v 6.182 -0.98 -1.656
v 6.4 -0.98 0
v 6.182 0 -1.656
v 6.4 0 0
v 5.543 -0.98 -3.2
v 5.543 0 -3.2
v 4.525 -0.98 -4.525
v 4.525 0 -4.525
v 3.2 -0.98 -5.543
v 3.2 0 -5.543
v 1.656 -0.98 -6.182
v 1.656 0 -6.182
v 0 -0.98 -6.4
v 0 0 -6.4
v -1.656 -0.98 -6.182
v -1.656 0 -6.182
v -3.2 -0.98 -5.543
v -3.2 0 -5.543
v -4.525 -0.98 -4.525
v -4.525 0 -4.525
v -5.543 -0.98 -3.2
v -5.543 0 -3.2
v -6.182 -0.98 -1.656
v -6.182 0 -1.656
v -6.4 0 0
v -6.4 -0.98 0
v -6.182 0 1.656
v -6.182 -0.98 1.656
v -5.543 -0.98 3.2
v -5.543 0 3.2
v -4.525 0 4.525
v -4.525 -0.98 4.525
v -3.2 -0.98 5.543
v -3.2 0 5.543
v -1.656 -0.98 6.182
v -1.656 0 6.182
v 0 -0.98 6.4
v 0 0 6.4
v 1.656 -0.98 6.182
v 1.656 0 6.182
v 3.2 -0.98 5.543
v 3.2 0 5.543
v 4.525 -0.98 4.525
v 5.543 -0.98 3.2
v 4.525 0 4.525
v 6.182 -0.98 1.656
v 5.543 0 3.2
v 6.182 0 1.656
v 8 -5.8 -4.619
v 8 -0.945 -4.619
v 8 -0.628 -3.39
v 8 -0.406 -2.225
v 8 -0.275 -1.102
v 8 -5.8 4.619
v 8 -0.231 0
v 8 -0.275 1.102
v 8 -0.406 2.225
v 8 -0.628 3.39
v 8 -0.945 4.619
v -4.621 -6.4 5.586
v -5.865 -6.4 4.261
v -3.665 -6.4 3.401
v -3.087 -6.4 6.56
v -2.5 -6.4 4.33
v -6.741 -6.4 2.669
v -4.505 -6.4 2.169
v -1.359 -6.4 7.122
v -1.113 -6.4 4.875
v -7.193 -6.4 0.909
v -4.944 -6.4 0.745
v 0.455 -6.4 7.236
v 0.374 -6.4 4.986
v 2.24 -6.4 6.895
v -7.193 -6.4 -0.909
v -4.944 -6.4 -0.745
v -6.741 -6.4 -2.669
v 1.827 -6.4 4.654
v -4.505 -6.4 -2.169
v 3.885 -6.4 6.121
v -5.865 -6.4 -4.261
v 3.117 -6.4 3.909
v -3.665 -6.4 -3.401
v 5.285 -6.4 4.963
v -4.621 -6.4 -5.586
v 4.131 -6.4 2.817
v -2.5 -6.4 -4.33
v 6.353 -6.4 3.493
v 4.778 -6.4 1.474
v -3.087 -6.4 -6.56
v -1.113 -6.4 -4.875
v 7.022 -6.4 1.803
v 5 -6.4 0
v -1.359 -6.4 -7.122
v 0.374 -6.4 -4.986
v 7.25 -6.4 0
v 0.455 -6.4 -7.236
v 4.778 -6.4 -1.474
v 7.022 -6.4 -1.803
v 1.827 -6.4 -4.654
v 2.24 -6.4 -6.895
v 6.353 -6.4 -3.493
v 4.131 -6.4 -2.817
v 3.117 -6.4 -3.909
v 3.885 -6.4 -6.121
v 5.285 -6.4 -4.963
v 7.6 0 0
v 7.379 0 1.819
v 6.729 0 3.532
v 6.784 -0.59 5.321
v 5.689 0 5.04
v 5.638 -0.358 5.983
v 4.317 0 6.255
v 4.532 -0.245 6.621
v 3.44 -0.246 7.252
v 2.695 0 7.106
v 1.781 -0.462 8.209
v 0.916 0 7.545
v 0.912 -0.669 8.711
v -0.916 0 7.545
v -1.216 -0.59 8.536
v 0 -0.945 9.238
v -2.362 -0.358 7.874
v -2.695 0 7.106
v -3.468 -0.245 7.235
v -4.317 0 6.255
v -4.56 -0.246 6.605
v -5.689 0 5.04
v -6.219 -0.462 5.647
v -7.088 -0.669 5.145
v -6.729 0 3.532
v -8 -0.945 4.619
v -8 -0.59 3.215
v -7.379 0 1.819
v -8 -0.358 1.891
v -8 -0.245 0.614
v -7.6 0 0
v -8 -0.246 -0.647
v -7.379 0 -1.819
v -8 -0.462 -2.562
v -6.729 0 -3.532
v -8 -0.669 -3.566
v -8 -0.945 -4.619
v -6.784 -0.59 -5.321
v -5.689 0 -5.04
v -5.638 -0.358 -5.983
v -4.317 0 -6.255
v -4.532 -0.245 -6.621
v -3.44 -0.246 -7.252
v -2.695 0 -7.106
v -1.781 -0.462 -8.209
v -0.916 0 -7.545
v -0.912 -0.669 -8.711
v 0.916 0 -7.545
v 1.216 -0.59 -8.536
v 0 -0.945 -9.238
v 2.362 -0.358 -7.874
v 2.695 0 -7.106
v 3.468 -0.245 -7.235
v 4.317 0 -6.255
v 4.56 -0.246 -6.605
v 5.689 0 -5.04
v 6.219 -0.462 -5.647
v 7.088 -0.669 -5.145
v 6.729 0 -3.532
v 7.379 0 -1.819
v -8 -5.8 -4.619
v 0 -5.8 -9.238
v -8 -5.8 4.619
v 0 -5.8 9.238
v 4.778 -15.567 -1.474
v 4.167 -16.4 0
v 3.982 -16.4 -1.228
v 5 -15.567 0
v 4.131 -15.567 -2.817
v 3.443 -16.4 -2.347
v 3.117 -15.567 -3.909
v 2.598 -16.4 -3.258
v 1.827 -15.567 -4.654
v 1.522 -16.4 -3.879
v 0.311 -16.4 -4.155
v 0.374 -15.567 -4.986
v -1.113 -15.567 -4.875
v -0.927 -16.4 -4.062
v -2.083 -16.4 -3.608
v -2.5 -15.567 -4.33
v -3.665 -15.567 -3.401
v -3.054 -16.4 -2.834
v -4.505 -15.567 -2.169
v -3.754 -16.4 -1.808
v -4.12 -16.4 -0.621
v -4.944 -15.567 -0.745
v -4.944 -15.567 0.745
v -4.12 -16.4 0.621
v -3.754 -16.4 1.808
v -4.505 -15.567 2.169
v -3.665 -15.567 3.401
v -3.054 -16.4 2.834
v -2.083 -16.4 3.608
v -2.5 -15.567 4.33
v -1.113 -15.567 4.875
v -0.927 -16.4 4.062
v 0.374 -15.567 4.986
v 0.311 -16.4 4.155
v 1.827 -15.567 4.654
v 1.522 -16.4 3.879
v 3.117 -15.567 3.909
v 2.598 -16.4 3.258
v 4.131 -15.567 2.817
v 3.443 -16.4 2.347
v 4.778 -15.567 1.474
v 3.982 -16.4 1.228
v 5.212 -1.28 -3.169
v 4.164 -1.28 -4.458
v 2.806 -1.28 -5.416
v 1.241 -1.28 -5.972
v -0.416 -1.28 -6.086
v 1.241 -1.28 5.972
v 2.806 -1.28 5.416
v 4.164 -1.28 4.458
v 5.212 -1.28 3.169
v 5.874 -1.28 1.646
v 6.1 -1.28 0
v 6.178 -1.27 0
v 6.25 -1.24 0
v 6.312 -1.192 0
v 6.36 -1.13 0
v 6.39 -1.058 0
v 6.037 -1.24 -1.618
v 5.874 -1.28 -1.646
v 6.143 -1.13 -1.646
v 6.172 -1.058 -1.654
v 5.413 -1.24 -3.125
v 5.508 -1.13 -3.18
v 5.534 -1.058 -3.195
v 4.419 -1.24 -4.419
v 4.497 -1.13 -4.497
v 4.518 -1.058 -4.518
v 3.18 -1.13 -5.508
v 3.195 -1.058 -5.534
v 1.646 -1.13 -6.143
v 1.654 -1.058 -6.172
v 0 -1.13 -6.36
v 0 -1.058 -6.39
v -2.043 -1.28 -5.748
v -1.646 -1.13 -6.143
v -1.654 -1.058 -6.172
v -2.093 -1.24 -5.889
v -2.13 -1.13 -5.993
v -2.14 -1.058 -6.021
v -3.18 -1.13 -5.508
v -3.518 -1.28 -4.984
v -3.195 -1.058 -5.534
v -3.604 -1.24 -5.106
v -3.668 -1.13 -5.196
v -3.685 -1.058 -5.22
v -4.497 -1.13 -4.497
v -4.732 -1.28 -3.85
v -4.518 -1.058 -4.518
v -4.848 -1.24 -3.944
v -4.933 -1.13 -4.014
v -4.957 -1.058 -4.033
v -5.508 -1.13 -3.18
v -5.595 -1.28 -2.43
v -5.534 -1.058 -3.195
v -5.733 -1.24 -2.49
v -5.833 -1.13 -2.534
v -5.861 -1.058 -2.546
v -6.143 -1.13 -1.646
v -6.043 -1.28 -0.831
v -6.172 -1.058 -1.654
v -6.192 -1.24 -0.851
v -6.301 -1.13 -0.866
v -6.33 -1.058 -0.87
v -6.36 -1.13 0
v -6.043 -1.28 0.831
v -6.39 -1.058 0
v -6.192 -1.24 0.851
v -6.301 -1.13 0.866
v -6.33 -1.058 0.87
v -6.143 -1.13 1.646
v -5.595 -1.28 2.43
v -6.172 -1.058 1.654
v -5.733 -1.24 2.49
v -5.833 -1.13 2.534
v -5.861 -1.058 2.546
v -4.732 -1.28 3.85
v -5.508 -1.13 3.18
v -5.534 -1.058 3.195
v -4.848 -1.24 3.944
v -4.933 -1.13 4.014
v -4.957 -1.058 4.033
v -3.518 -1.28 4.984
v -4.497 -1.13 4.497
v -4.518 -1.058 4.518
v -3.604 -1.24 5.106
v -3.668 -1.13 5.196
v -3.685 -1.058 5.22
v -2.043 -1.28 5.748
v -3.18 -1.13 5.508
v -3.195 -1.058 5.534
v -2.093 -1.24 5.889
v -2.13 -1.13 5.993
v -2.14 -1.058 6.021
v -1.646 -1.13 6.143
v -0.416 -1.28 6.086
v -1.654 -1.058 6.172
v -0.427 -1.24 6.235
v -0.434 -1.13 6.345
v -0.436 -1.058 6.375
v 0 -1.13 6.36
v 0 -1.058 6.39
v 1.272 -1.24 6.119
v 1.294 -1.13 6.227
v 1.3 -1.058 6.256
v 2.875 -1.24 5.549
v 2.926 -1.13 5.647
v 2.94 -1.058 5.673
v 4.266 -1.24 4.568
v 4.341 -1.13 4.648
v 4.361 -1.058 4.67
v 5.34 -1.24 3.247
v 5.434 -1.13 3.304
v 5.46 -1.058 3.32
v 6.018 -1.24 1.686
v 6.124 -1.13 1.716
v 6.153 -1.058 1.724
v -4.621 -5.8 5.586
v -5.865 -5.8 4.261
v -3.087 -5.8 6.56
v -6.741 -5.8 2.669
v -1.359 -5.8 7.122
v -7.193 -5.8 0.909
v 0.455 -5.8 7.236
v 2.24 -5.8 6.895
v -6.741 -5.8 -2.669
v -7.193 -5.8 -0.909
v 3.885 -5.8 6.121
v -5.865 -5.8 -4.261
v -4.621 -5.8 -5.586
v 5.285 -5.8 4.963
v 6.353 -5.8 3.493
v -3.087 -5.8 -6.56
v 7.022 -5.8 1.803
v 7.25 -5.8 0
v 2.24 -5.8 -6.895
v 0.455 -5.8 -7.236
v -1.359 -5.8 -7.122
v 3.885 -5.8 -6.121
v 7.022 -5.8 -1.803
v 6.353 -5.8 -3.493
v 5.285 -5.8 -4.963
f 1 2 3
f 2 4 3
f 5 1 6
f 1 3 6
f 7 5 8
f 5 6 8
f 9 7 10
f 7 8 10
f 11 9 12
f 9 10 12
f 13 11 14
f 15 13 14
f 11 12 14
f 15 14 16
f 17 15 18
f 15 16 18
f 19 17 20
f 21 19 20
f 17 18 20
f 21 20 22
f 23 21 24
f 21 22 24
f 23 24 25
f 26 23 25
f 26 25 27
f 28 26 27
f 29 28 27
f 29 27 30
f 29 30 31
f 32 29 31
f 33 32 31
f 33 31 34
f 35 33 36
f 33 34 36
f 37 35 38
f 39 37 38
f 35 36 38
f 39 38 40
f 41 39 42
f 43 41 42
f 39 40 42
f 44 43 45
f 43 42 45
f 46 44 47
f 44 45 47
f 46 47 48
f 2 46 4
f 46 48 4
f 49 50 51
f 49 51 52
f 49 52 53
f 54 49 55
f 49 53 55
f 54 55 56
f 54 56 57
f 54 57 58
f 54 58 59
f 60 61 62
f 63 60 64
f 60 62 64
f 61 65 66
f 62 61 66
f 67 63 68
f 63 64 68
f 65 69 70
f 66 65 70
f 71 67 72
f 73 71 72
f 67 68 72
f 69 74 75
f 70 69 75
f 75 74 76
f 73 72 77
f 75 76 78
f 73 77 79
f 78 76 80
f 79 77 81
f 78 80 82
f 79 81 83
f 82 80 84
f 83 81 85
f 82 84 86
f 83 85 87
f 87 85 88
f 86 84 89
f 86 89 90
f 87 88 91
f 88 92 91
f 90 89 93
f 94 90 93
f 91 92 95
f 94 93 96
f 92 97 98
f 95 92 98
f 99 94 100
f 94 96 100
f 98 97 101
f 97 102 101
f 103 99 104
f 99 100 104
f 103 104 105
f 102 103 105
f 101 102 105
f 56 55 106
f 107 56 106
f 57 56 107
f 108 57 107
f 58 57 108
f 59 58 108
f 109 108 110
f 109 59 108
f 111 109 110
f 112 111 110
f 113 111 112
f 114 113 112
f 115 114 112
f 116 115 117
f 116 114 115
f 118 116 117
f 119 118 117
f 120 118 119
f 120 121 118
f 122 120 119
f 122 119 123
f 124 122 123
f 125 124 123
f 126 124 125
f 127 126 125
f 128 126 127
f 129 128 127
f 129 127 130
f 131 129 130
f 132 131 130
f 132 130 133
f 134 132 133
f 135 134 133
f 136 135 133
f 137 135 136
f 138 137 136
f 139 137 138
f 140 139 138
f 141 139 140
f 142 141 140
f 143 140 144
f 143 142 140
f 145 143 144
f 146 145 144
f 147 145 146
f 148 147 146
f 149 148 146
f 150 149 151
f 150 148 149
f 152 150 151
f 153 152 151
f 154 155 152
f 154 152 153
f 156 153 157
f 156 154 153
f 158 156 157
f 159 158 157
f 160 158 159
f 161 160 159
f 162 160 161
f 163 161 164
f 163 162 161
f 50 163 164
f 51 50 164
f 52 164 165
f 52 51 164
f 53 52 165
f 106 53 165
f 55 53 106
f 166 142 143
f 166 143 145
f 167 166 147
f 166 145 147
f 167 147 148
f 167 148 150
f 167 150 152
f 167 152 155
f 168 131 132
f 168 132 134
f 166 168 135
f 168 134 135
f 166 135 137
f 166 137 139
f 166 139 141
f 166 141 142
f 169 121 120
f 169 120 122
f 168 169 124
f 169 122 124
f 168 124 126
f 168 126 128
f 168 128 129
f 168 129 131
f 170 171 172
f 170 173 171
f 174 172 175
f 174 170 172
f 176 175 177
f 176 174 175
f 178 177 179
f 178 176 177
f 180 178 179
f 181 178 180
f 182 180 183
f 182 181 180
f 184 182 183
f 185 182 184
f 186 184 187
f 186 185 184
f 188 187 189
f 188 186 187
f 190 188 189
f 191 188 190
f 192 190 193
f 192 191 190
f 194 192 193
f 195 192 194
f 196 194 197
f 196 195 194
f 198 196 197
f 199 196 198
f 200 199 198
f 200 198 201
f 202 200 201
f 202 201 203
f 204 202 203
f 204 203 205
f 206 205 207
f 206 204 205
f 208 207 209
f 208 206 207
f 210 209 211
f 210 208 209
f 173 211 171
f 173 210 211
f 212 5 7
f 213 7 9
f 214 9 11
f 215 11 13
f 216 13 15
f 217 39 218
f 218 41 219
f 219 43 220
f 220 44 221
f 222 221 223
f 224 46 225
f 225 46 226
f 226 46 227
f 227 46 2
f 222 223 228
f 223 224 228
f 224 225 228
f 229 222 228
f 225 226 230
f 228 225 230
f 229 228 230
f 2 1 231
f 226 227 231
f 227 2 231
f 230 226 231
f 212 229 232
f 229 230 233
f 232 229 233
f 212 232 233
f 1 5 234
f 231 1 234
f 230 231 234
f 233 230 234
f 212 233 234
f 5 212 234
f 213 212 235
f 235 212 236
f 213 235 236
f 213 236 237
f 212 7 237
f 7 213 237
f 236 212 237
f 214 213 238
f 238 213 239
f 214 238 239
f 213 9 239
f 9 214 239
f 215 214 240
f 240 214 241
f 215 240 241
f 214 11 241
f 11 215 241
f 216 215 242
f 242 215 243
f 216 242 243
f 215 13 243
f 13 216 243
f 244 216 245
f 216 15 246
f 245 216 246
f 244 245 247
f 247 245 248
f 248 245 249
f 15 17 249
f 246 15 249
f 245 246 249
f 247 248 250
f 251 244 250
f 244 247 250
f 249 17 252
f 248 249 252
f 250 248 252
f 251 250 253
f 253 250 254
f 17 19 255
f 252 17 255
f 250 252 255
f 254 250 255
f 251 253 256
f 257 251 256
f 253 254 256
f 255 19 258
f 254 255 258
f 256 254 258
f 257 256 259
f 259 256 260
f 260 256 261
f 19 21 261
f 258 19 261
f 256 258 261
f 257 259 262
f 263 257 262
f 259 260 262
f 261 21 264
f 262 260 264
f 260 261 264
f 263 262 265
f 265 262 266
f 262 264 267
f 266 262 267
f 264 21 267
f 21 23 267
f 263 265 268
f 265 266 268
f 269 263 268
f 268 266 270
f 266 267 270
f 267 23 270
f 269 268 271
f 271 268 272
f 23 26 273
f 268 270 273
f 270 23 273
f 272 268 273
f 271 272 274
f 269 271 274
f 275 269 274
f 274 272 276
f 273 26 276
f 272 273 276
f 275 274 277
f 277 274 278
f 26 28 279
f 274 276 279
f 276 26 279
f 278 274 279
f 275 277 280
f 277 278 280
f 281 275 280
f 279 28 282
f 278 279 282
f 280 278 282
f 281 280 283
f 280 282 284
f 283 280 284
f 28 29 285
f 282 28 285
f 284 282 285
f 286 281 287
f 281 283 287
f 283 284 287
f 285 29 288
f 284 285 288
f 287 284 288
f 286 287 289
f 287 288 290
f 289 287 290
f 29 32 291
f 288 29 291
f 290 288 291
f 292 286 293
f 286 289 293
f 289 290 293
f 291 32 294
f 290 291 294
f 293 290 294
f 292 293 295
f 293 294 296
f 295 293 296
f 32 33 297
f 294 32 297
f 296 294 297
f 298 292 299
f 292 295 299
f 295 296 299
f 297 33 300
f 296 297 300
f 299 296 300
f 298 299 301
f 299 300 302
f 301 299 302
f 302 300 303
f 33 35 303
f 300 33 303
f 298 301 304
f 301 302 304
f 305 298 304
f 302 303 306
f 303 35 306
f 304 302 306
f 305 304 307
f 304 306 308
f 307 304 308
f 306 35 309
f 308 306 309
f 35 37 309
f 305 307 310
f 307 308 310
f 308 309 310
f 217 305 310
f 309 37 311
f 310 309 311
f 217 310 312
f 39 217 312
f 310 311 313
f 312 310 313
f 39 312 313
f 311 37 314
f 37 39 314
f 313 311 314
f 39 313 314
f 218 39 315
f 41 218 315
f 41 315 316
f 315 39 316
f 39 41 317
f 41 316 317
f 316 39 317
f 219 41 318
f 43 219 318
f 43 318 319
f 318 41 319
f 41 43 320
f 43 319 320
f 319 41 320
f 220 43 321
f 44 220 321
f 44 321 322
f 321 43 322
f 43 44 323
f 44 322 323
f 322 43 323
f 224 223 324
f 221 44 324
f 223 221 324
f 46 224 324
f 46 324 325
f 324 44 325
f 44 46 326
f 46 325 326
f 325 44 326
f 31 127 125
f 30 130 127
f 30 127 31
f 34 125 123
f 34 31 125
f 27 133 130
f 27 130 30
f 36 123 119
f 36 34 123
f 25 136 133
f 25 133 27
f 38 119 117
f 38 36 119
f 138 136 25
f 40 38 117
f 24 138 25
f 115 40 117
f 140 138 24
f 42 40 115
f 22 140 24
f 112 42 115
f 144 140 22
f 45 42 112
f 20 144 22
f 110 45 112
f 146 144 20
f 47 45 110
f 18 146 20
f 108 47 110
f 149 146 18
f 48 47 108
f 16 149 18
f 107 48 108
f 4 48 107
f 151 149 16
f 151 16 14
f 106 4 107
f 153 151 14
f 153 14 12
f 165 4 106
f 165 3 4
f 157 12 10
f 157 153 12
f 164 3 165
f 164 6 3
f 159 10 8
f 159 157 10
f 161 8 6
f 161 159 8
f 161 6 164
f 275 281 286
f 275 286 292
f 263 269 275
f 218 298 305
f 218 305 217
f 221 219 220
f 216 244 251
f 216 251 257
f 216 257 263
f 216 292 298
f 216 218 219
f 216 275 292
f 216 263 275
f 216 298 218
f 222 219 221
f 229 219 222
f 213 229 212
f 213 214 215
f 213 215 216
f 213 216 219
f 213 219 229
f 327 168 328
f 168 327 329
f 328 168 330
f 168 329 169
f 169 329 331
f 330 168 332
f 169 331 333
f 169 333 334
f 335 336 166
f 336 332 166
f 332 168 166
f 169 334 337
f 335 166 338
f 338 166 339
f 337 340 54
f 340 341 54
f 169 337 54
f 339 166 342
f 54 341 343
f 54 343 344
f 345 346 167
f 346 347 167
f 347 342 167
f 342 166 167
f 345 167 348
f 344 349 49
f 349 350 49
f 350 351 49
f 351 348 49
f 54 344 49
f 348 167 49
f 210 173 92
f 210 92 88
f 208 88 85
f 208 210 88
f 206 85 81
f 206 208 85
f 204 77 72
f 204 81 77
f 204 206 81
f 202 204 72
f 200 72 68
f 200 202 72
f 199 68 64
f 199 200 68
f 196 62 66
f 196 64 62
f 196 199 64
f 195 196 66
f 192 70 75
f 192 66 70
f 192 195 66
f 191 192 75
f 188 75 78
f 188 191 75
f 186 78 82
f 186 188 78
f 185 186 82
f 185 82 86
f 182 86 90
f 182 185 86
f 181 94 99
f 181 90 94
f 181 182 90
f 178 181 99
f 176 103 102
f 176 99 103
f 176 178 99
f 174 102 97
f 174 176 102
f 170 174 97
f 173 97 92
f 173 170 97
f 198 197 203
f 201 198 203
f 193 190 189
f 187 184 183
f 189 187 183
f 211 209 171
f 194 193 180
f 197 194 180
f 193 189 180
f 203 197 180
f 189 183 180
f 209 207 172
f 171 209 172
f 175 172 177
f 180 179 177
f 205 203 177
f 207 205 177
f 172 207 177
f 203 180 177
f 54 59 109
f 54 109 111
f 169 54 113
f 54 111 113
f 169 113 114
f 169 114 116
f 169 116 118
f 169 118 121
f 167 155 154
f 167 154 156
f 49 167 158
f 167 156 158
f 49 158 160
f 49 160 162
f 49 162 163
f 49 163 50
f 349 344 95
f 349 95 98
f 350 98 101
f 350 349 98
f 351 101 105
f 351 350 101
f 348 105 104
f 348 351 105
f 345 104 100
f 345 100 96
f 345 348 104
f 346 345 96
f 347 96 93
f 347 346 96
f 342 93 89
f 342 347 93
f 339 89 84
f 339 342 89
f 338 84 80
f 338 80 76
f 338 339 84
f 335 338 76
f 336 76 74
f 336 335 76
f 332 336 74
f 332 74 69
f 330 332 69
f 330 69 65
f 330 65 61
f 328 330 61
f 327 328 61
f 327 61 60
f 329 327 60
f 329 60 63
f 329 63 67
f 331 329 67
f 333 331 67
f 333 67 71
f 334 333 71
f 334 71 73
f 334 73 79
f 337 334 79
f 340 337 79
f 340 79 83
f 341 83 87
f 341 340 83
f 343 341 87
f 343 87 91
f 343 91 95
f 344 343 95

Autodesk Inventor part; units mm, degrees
ref_plane "YZ Plane" through (0, 0, 0) normal (1, 0, 0) x (0, 1, 0)
ref_plane "XZ Plane" through (0, 0, 0) normal (0, 1, 0) x (-1, 0, 0)
ref_plane "XY Plane" through (0, 0, 0) normal (0, 0, 1) x (1, 0, 0)
sketch "Sketch1" plane through (0, 0, 0) normal (0, 0, 1) x (1, 0, 0)
  line L0 (6.4, 0) -> (7.6, 0)
  line L1 (12, -2.5403) -> (12, -5.8)
  line L2 (7.25, -6.4) -> (5, -6.4)
  line L3 (5, -6.4) -> (5, -16.4)
  line L4 (5, -16.4) -> (0, -16.4)
  line L5 (0, -16.4) -> (0, 0)
  line L6 (7.25, -6.4) -> (7.25, -5.8)
  line L7 (7.25, -5.8) -> (12, -5.8)
  line L8 (0, -1.28) -> (6.1, -1.28)
  line L9 (6.4, -0.98) -> (6.4, 0)
  line L10 (7.6, 0) -> (12, -2.5403)
  arc A0 (6.1, -1.28) -> (6.4, -0.98) centre (6.1, -0.98) ccw
  dimension "d0" = 24
  dimension "d1" = 10
  dimension "d3" = 10
  dimension "d4" = 14.5
  dimension "d5" = 0.6
  dimension "d26" = 15.2
  dimension "d27" = 30
  dimension "d28" = 12.8
  dimension "d29" = 1.28
  dimension "d30" = 0.3
  dimension "d31" = 6.4
revolve "Revolution1" add sketch "Sketch1" angle 360 about axis through (0, -16.4, 0) along (0, 1, 0)
sketch "Sketch2" plane through (0, 0, 0) normal (0, 1, 0) x (1, 0, 0)
  line L0 (0, -9.2376) -> (-8, -4.6188)
  line L1 (-8, -4.6188) -> (-8, 4.6188)
  line L2 (-8, 4.6188) -> (0, 9.2376)
  line L3 (0, 9.2376) -> (8, 4.6188)
  line L4 (8, 4.6188) -> (8, -4.6188)
  line L5 (8, -4.6188) -> (0, -9.2376)
  circle A0 centre (0, 0) radius 12 projected
  point P0 (0, 0)
  point P1 (0, 0)
  dimension "d32" = 16
extrude "Extrusion1" cut sketch "Sketch2" against normal blind 5.8
thread "Thread1" size "M10x1.5" class "6g" standard "ISO Metric profile" length 8
chamfer "Chamfer1" distance 0.8333 angle 45 1 edges at (-5, -16.4, 0)
equation "\"d0\" = 1.5 * S_"
equation "\"d1\" = d1_"
equation "\"d3\" = L"
equation "\"d4\" = dw"
equation "\"d5\" = hw"
equation "\"d26\" = 0.95 * S_"
equation "\"d28\" = 0.8 * S_"
equation "\"d29\" = 0.2 * k"
equation "\"d31\" = k"
equation "\"d14\" = b"
equation "\"d16\" = 0.0833333 * d"
equation "\"d32\" = S_"
equation "\"d33\" = k - hw"
equation "\"d1_\" = 10"
equation "\"S_\" = 16"
equation "\"k\" = 6.4"
equation "\"e\" = 17.6"
equation "\"L\" = 10"
equation "\"b\" = 8"
equation "\"Grip_Length\" = 2"
equation "\"dw\" = 14.5"
equation "\"hw\" = 0.6"
equation "\"d\" = 10"
properties part number "Bolt 4A M10-6g×10(S16) GOST 7798-70" material "Steel, Mild"
